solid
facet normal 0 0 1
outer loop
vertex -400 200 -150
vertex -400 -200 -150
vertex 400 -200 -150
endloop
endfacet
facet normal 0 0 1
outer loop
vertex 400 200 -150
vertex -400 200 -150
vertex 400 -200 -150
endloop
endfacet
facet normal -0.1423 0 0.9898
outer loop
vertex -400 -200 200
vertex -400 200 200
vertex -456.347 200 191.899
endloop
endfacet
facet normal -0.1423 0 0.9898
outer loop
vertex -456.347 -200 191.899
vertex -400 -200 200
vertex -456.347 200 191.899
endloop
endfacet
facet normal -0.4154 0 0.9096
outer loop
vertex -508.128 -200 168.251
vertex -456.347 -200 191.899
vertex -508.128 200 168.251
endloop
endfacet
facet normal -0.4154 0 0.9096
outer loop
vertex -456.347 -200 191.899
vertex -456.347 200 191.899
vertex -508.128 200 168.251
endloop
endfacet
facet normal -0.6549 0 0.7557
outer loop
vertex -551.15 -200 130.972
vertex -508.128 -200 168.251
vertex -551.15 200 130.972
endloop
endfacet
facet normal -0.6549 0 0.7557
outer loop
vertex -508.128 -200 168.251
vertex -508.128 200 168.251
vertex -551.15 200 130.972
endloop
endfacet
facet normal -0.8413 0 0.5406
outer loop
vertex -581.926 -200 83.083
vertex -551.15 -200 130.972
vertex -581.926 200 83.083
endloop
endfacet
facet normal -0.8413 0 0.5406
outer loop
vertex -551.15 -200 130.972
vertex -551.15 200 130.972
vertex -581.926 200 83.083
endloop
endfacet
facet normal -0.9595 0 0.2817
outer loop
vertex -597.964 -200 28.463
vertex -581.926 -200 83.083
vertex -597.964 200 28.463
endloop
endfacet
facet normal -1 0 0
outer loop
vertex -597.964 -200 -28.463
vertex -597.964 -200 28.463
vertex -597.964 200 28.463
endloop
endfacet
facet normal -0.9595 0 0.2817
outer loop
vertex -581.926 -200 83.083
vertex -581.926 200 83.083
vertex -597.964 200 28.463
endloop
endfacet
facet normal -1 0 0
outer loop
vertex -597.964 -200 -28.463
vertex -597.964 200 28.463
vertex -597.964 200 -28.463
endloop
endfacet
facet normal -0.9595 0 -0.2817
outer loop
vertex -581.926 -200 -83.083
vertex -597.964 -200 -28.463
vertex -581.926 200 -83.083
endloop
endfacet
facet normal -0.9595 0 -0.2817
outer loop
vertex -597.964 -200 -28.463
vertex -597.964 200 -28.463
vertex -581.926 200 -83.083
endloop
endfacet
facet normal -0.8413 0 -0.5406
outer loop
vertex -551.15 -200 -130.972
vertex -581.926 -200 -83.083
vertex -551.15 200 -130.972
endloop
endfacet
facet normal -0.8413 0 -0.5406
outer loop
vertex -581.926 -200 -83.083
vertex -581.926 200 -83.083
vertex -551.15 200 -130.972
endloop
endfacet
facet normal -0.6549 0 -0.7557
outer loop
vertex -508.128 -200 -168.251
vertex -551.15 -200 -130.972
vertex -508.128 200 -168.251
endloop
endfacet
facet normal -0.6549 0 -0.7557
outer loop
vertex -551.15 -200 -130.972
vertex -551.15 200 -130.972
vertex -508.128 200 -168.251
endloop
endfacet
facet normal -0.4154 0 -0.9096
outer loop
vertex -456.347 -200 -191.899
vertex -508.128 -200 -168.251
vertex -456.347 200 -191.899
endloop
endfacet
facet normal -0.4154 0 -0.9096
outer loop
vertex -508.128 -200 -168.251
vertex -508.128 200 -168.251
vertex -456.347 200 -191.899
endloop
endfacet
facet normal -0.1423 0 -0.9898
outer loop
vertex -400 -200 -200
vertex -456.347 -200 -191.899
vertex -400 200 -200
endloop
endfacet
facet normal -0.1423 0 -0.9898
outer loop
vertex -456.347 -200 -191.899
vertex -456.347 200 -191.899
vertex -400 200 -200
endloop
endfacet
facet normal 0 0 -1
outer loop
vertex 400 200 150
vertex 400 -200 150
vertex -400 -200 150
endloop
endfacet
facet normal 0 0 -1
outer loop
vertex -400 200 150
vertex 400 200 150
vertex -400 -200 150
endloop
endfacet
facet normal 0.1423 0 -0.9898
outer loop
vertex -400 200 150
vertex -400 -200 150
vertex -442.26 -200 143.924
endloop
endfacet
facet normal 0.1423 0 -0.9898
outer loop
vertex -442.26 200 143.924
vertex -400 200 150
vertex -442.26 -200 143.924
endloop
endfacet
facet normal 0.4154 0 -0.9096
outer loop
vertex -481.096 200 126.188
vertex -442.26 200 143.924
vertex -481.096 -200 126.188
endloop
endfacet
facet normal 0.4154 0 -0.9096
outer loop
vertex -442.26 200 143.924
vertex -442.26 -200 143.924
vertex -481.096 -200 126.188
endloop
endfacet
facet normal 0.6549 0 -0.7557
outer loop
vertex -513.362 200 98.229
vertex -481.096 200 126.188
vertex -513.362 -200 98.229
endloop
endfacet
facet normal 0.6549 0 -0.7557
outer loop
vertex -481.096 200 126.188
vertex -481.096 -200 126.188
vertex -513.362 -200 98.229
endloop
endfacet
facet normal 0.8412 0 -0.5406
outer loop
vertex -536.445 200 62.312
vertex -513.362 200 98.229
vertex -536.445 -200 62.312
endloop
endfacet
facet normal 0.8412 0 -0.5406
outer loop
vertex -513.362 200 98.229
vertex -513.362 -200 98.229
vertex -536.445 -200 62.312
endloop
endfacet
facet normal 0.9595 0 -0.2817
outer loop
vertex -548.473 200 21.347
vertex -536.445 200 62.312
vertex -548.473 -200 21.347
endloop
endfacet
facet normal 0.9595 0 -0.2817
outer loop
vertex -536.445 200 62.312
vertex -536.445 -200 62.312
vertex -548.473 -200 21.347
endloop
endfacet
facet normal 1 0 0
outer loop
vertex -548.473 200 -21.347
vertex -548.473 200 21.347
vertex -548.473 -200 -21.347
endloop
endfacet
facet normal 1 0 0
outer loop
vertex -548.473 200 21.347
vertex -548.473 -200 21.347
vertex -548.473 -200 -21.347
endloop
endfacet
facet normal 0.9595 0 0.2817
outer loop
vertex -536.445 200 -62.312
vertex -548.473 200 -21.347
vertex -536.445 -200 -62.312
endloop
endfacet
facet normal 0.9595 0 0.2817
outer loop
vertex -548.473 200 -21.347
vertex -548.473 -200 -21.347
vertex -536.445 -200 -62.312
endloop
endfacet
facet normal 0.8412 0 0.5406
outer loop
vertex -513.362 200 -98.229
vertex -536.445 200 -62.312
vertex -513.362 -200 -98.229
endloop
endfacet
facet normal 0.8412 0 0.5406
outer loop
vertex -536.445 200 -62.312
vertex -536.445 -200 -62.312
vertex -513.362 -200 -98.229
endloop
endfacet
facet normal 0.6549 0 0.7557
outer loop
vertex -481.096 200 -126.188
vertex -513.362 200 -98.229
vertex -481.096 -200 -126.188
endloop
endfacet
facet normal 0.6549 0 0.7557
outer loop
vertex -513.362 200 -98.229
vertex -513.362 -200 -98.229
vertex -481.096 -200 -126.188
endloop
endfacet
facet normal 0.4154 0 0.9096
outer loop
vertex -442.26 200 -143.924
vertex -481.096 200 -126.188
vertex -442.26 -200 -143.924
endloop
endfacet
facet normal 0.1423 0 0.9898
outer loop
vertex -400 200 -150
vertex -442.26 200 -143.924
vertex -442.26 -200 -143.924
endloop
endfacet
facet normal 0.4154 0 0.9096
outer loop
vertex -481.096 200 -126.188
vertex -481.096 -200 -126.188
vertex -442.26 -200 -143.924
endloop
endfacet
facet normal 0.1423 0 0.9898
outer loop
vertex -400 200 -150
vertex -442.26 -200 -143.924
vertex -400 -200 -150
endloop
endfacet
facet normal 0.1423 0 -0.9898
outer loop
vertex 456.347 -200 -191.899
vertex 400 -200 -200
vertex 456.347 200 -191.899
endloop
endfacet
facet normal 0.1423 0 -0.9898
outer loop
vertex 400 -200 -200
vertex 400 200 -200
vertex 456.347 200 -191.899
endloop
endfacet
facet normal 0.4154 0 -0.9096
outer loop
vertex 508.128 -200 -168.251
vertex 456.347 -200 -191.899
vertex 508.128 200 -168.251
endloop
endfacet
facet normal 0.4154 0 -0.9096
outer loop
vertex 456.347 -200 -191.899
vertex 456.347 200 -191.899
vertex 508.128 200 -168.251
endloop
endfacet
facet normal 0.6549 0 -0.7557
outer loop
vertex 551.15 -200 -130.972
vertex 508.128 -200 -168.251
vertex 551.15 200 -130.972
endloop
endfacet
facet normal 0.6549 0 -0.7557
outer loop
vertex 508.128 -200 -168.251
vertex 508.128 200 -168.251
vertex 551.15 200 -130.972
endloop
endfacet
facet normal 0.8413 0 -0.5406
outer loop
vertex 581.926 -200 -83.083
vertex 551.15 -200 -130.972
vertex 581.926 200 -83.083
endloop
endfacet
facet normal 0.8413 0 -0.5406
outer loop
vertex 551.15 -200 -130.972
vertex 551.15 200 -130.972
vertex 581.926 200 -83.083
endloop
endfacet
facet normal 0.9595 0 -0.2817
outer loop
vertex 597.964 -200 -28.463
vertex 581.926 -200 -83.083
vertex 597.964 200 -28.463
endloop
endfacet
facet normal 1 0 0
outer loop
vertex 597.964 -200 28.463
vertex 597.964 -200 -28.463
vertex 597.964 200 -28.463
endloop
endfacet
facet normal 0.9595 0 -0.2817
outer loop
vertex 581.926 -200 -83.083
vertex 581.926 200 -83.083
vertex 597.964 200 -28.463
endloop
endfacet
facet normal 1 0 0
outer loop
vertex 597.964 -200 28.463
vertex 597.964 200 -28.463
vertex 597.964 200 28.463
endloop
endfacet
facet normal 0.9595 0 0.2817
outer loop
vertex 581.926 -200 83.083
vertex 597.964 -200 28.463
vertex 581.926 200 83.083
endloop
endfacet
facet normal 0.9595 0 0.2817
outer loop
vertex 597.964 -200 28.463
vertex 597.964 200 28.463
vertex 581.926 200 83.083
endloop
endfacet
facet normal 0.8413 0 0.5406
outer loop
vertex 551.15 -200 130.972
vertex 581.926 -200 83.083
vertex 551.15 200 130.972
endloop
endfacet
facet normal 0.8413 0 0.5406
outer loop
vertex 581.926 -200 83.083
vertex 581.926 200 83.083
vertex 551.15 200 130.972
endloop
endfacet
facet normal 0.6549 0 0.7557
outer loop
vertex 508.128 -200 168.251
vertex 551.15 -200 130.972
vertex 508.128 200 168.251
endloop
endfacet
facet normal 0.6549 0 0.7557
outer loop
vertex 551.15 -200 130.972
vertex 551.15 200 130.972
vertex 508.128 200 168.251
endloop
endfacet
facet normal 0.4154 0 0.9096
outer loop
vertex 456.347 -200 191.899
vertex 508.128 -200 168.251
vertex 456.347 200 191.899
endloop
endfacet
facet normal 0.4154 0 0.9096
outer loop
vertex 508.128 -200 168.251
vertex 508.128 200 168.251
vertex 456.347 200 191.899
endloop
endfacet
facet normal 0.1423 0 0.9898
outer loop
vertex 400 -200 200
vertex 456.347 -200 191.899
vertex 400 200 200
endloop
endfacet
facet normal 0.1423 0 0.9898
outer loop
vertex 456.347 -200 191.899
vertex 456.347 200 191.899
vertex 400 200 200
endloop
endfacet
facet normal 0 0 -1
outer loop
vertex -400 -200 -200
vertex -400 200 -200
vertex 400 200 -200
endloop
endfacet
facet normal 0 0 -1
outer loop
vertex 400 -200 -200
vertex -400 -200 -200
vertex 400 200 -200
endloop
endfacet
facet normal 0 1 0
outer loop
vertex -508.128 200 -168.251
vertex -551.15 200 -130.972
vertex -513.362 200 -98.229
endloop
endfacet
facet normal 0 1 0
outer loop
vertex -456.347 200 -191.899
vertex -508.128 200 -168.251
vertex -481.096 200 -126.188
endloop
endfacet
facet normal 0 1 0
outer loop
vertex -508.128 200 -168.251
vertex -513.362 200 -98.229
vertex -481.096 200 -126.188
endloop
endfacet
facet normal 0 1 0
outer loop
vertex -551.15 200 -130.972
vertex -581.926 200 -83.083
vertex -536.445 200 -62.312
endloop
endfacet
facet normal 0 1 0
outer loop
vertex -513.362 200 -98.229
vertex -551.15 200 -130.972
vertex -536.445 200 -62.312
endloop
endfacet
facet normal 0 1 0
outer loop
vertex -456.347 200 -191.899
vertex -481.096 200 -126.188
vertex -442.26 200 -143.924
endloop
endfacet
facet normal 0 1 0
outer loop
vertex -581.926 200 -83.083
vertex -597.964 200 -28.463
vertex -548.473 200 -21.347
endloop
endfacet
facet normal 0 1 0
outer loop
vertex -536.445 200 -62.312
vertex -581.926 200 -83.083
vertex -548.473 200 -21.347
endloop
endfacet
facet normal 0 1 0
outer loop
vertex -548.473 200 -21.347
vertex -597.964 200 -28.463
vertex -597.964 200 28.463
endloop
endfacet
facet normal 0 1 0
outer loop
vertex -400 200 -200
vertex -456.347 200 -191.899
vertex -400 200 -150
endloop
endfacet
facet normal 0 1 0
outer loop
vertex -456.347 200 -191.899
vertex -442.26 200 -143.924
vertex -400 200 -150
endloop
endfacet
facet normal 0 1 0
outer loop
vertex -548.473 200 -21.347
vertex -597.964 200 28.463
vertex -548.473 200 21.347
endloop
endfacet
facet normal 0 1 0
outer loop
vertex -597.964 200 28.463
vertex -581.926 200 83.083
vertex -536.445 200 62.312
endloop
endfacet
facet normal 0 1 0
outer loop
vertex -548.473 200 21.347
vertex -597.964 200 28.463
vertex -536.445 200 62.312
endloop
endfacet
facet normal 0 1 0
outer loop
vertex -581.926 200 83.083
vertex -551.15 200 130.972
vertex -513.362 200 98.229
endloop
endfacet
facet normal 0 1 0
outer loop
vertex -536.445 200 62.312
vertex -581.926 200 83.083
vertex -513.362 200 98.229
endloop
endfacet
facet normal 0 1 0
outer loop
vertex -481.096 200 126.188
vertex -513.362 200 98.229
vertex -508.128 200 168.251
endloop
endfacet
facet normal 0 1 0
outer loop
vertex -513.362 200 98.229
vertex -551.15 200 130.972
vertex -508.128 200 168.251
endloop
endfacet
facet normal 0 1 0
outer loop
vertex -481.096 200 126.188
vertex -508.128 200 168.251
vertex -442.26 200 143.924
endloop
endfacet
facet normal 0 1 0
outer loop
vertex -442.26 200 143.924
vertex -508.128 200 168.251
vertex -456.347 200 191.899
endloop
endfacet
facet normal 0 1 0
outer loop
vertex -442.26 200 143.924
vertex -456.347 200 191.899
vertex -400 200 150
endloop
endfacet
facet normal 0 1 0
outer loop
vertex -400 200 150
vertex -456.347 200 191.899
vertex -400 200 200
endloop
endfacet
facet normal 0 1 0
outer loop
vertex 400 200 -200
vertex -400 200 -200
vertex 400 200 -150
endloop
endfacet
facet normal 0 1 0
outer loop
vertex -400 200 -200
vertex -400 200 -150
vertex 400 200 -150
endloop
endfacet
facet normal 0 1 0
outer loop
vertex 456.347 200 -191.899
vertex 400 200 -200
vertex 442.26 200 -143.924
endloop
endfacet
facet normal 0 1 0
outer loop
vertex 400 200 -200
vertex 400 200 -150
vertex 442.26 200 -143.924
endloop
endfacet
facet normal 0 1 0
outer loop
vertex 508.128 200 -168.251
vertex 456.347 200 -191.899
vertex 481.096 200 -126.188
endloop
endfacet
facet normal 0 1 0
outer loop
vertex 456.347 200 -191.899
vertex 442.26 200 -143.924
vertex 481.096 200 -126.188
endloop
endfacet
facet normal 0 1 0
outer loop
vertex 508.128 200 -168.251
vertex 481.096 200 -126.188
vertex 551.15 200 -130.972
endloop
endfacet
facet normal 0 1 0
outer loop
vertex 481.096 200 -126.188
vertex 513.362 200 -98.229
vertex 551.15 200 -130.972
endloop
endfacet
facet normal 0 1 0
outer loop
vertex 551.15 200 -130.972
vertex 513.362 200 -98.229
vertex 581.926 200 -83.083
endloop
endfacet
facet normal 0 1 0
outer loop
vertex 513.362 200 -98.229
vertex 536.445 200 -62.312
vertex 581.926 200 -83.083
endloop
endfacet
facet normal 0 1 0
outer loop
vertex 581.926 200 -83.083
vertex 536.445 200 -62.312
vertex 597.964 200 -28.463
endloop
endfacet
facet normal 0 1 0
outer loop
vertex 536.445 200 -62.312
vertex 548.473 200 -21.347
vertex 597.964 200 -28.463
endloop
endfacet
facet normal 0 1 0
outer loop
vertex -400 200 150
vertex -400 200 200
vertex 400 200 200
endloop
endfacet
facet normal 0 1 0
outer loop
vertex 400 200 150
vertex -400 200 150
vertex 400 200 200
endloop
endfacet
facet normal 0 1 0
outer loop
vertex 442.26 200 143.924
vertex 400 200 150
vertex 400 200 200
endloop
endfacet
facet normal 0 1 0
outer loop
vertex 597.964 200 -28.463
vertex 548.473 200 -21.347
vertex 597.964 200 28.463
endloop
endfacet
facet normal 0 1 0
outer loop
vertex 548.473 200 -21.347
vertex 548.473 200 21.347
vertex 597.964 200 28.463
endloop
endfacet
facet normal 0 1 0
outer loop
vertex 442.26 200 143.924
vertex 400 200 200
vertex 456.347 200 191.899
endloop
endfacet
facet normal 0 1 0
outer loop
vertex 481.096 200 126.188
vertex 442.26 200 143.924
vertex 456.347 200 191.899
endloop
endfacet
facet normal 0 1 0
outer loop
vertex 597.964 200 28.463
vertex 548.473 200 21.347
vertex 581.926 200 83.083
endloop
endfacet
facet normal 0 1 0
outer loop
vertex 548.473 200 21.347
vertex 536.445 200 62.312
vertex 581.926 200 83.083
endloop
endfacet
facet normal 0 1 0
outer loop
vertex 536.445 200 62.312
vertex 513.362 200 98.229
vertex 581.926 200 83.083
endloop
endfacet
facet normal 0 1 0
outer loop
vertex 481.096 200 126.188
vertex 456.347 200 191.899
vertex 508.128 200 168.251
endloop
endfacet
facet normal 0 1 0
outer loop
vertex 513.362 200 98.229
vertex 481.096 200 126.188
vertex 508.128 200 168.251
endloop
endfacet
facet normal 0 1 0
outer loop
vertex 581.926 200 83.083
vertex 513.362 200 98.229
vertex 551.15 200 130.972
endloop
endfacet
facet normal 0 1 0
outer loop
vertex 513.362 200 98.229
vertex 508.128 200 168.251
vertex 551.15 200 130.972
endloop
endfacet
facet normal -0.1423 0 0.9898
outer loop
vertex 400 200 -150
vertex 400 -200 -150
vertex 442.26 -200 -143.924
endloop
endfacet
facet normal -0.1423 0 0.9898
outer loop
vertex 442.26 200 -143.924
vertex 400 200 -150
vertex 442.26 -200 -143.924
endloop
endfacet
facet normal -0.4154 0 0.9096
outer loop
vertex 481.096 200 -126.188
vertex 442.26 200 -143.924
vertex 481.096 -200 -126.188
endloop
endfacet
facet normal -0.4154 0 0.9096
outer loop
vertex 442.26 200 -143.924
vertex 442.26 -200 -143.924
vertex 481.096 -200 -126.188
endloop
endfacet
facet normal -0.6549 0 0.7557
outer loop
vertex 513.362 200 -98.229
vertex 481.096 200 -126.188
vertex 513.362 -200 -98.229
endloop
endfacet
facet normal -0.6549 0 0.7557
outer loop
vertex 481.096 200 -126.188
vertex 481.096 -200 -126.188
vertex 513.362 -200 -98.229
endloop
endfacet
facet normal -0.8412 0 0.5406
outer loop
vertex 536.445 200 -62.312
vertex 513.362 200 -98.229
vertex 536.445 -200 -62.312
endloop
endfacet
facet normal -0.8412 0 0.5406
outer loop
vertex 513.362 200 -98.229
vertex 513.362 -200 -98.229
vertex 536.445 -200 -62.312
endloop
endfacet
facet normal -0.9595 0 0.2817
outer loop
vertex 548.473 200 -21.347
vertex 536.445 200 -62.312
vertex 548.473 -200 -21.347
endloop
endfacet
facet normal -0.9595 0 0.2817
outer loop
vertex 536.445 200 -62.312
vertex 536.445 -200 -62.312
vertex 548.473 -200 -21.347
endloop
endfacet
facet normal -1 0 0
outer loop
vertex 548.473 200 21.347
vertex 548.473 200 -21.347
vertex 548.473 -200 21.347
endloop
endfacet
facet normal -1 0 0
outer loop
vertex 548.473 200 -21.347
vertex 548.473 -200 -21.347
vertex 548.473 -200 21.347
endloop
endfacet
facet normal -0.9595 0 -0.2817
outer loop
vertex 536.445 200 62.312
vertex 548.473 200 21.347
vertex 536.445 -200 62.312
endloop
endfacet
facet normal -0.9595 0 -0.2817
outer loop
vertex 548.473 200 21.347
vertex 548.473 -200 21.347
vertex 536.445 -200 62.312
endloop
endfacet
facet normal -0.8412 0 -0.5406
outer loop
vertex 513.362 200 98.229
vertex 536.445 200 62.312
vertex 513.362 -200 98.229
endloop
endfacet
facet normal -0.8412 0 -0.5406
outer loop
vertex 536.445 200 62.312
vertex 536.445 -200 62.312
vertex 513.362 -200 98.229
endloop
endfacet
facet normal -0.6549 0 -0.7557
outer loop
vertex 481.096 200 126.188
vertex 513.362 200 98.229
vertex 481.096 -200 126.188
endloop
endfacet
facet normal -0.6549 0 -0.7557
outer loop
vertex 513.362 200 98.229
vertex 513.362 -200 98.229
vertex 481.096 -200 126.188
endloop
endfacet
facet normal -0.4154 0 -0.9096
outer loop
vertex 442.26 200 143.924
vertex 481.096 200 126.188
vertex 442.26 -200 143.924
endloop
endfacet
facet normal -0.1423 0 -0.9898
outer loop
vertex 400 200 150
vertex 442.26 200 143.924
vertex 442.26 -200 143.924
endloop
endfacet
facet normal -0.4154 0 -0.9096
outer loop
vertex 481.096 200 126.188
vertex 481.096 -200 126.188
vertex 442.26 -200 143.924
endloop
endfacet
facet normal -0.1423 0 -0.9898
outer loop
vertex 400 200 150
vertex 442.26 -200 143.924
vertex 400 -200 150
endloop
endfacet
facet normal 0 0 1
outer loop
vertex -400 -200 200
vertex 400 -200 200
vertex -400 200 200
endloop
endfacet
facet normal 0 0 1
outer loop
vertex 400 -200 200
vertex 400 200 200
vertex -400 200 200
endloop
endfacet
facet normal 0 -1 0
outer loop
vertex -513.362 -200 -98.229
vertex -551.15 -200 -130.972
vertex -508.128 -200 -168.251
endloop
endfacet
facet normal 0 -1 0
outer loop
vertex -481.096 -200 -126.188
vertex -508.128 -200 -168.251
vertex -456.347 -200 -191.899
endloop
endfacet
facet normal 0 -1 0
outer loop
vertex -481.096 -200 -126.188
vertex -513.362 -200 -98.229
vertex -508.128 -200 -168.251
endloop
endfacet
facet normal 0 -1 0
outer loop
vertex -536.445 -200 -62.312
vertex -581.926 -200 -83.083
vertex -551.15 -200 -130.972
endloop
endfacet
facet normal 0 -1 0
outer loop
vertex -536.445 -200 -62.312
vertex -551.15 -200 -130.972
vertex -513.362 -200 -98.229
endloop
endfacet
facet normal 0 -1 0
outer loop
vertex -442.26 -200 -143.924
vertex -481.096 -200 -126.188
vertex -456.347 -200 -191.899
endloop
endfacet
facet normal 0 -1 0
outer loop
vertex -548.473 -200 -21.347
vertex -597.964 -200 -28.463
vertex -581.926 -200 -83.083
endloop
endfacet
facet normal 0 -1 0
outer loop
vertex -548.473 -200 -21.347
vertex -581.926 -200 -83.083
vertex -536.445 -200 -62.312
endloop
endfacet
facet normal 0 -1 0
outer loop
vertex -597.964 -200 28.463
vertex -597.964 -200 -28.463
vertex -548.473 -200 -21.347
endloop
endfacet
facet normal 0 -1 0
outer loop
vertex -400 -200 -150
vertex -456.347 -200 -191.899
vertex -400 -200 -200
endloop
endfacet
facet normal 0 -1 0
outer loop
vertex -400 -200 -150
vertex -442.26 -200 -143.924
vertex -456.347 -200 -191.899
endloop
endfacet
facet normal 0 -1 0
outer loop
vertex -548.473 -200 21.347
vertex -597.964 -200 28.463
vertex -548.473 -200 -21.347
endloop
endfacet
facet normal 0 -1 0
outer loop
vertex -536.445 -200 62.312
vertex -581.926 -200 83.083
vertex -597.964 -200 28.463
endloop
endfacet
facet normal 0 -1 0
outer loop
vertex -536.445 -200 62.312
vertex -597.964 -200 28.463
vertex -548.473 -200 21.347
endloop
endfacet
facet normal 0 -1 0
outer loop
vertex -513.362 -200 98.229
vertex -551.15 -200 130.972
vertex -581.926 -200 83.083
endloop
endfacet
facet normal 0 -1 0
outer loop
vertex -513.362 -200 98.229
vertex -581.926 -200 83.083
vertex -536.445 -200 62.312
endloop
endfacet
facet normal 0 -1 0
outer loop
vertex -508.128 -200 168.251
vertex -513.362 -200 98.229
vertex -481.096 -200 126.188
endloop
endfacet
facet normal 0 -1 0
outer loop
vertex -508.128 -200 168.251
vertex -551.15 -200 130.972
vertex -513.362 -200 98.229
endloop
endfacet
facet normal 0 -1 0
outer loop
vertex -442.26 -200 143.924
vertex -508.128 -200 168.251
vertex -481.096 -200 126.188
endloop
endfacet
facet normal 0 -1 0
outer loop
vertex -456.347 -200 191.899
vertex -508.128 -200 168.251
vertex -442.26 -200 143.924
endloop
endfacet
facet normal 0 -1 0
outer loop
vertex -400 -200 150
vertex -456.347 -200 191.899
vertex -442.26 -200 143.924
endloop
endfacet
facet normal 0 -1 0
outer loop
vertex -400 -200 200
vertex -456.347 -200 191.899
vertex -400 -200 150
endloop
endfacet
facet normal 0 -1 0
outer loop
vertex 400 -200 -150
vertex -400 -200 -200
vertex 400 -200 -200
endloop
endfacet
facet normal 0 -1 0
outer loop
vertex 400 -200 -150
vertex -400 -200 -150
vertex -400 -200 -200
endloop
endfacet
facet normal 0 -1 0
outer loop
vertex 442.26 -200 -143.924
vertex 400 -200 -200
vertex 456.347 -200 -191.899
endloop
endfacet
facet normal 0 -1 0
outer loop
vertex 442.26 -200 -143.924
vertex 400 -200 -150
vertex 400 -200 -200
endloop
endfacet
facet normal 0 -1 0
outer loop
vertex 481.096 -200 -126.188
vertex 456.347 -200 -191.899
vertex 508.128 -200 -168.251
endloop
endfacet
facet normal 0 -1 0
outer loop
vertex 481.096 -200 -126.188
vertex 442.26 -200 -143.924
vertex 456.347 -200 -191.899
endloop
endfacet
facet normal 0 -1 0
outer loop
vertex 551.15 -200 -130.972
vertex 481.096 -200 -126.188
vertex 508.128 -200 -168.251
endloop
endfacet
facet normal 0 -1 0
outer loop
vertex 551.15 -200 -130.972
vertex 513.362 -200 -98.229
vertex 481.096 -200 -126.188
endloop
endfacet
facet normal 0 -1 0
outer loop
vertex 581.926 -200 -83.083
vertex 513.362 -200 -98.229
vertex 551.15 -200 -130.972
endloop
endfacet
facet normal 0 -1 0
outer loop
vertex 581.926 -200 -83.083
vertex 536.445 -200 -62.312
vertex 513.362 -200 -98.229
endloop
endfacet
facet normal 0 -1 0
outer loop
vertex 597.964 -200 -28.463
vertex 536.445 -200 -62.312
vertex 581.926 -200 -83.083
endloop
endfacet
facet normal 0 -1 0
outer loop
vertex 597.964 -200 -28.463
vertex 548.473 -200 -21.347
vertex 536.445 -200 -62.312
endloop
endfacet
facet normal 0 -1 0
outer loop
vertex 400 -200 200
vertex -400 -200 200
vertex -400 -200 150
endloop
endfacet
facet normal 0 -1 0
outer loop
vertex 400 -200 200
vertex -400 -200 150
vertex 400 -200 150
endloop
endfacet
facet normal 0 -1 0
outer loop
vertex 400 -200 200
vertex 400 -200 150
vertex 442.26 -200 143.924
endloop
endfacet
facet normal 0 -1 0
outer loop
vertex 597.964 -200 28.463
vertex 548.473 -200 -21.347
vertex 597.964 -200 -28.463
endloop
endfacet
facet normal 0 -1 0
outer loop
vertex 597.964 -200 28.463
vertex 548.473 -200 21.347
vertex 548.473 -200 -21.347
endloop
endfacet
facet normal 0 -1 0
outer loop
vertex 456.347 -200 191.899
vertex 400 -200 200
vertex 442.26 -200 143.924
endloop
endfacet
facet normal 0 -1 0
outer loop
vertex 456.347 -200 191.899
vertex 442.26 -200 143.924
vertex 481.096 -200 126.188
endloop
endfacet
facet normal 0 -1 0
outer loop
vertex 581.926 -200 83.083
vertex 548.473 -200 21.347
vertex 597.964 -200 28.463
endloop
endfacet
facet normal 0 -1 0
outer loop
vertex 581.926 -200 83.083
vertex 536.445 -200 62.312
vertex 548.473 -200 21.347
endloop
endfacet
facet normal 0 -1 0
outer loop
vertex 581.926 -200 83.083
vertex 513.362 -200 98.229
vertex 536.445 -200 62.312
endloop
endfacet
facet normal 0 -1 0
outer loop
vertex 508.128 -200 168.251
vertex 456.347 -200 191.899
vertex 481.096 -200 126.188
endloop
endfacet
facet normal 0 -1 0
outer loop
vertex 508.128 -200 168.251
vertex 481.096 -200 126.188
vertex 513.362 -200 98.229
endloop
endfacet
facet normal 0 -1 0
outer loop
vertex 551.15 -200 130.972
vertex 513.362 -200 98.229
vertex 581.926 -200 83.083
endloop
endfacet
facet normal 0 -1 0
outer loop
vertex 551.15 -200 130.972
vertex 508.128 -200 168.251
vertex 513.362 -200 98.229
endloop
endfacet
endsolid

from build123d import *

# Parameters (mm, degrees)
F2_DEPTH      = 200
F2_DEPTH_BACK = 200
F4_DEPTH      = 4000


with BuildPart() as f2:
    # F1 (on face) → F2 (new body, two sides)
    with BuildSketch(Plane.XZ) as f2_sk:
        with BuildLine():
            Line((-400, -200), (400, -200))
            ThreePointArc((400, -200), (600, 0), (400, 200))
            Line((400, 200), (-400, 200))
            ThreePointArc((-400, 200), (-600, 0), (-400, -200))
        make_face()
    extrude(amount=-F2_DEPTH)
    extrude(f2_sk.sketch, amount=F2_DEPTH_BACK)

    # F3 (on face) → F4 (cut)
    with BuildSketch(Plane.XZ.offset(200)):
        with BuildLine():
            Line((-400, -150), (400, -150))
            ThreePointArc((400, -150), (550, 0), (400, 150))
            Line((400, 150), (-400, 150))
            ThreePointArc((-400, 150), (-550, 0), (-400, -150))
        make_face()
    extrude(amount=-F4_DEPTH, mode=Mode.SUBTRACT)


solid = f2.part
